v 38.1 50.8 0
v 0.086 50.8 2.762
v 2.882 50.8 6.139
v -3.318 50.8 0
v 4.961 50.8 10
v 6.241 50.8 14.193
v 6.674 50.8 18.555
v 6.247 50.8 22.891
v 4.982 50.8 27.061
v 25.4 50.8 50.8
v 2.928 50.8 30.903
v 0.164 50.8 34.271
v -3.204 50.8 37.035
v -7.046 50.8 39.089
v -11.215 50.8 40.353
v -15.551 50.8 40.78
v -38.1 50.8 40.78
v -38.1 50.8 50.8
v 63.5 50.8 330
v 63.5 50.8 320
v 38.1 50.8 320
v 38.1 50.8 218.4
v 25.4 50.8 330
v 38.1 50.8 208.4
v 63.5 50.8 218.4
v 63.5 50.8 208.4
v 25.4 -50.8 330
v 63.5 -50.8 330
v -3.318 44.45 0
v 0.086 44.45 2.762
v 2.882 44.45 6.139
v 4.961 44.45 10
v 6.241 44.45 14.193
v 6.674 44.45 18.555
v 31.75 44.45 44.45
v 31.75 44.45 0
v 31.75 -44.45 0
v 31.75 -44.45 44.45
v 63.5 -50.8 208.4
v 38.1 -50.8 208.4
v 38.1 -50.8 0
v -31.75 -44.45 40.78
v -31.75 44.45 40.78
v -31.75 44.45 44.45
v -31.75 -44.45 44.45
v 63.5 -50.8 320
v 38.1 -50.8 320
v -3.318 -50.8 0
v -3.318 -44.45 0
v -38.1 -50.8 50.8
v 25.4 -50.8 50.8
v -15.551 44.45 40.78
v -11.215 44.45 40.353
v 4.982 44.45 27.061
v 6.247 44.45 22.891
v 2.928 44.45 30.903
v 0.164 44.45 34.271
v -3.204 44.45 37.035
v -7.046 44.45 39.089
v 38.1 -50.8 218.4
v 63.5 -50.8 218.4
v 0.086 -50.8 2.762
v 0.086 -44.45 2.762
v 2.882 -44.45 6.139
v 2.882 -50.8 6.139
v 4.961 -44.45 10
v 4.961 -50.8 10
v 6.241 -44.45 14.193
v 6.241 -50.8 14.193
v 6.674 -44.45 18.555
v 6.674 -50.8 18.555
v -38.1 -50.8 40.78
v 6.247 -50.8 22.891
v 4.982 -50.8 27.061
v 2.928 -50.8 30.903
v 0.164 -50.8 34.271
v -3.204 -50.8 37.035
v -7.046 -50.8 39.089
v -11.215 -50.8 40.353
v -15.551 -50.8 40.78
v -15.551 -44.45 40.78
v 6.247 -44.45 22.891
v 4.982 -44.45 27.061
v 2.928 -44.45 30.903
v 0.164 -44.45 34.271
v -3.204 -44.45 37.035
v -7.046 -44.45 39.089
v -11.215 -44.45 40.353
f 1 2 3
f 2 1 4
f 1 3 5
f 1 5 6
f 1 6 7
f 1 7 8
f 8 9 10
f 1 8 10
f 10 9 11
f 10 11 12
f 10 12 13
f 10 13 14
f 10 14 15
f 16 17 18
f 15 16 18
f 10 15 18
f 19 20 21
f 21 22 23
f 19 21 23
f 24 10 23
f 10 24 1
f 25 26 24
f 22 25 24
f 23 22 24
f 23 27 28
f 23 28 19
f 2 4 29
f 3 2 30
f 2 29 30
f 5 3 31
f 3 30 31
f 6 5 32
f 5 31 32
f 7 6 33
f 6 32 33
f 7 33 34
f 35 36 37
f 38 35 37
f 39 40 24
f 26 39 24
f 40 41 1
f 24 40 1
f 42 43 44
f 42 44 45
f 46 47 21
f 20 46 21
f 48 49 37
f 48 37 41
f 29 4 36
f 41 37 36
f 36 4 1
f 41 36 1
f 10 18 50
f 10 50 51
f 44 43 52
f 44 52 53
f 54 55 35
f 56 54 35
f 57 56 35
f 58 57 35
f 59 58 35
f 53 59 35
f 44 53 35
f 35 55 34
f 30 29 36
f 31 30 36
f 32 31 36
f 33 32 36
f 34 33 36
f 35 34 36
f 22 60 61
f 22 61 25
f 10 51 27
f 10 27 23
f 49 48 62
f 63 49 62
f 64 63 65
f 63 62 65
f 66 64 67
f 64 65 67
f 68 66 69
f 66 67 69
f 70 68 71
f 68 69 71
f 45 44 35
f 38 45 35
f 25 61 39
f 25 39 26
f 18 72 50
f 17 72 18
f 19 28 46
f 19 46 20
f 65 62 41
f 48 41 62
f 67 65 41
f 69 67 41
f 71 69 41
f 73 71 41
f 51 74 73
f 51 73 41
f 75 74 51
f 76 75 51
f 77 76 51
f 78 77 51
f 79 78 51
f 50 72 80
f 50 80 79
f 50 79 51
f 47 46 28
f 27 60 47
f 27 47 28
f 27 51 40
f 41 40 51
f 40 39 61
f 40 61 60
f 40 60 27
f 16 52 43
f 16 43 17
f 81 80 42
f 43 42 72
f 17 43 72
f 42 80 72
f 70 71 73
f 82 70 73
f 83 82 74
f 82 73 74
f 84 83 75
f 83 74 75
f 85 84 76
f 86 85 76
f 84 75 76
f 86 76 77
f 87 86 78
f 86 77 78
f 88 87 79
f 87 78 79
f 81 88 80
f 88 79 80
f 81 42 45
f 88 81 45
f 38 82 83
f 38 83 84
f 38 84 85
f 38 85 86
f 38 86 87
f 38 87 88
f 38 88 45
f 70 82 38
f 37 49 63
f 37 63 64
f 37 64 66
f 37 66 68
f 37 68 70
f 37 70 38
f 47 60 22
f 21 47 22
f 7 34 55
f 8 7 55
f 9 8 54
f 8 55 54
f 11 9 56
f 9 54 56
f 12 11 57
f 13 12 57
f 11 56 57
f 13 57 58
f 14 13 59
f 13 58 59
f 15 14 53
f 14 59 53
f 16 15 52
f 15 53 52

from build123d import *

# Parameters (mm, degrees)
F0_W     = 76.2
F0_H     = 101.6
F1_DEPTH = 50.8
F2_W     = 101.6
F2_H     = 330
F3_DEPTH = 12.7
F4_W     = 101.6
F4_H     = 10
F5_DEPTH = 25.4
F6_W     = 63.5
F6_H     = 88.9
F7_DEPTH = 44.45
F9_DEPTH = 114.808


with BuildPart() as f1:
    # F0 (on Top) → F1 (new body)
    with BuildSketch(Plane.XY):
        Rectangle(F0_W, F0_H)
    extrude(amount=F1_DEPTH)

    # F2 (on face) → F3 (join)
    with BuildSketch(Plane.YZ.offset(38.1)):
        with Locations((0, 165)):
            Rectangle(F2_W, F2_H)
    extrude(amount=-F3_DEPTH)

    # F4 (on face) → F5 (join)
    with BuildSketch(Plane.YZ.offset(38.1)):
        with Locations((0, 325)):
            Rectangle(F4_W, F4_H)
        with Locations((0, 213.4)):
            Rectangle(F4_W, F4_H)
    extrude(amount=F5_DEPTH)

    # F6 (on face) → F7 (cut)
    with BuildSketch(Plane(origin=(0, 0, 0), x_dir=(1, 0, 0), z_dir=(0, 0, -1))):
        Rectangle(F6_W, F6_H)
    extrude(amount=-F7_DEPTH, mode=Mode.SUBTRACT)

    # F8 (on face) → F9 (cut)
    with BuildSketch(Plane.XZ.offset(50.8)):
        with BuildLine():
            ThreePointArc((-27.784303, 0), (-5.013912, -1.01281), (6.673748, 18.555406))
            ThreePointArc((6.673748, 18.555406), (0.164196, 34.270854), (-15.551252, 40.780406))
            ThreePointArc((-15.551252, 40.780406), (-36.839095, 24.9412), (-27.784303, 0))
        make_face()
        with BuildLine():
            ThreePointArc((-27.784303, 0), (-36.839095, 24.9412), (-15.551252, 40.780406))
            Line((-15.551252, 40.780406), (-38.1, 40.780406))
            Line((-38.1, 40.780406), (-38.1, 0))
            Line((-38.1, 0), (-27.784303, 0))
        make_face()
    extrude(amount=-F9_DEPTH, mode=Mode.SUBTRACT)


solid = f1.part
